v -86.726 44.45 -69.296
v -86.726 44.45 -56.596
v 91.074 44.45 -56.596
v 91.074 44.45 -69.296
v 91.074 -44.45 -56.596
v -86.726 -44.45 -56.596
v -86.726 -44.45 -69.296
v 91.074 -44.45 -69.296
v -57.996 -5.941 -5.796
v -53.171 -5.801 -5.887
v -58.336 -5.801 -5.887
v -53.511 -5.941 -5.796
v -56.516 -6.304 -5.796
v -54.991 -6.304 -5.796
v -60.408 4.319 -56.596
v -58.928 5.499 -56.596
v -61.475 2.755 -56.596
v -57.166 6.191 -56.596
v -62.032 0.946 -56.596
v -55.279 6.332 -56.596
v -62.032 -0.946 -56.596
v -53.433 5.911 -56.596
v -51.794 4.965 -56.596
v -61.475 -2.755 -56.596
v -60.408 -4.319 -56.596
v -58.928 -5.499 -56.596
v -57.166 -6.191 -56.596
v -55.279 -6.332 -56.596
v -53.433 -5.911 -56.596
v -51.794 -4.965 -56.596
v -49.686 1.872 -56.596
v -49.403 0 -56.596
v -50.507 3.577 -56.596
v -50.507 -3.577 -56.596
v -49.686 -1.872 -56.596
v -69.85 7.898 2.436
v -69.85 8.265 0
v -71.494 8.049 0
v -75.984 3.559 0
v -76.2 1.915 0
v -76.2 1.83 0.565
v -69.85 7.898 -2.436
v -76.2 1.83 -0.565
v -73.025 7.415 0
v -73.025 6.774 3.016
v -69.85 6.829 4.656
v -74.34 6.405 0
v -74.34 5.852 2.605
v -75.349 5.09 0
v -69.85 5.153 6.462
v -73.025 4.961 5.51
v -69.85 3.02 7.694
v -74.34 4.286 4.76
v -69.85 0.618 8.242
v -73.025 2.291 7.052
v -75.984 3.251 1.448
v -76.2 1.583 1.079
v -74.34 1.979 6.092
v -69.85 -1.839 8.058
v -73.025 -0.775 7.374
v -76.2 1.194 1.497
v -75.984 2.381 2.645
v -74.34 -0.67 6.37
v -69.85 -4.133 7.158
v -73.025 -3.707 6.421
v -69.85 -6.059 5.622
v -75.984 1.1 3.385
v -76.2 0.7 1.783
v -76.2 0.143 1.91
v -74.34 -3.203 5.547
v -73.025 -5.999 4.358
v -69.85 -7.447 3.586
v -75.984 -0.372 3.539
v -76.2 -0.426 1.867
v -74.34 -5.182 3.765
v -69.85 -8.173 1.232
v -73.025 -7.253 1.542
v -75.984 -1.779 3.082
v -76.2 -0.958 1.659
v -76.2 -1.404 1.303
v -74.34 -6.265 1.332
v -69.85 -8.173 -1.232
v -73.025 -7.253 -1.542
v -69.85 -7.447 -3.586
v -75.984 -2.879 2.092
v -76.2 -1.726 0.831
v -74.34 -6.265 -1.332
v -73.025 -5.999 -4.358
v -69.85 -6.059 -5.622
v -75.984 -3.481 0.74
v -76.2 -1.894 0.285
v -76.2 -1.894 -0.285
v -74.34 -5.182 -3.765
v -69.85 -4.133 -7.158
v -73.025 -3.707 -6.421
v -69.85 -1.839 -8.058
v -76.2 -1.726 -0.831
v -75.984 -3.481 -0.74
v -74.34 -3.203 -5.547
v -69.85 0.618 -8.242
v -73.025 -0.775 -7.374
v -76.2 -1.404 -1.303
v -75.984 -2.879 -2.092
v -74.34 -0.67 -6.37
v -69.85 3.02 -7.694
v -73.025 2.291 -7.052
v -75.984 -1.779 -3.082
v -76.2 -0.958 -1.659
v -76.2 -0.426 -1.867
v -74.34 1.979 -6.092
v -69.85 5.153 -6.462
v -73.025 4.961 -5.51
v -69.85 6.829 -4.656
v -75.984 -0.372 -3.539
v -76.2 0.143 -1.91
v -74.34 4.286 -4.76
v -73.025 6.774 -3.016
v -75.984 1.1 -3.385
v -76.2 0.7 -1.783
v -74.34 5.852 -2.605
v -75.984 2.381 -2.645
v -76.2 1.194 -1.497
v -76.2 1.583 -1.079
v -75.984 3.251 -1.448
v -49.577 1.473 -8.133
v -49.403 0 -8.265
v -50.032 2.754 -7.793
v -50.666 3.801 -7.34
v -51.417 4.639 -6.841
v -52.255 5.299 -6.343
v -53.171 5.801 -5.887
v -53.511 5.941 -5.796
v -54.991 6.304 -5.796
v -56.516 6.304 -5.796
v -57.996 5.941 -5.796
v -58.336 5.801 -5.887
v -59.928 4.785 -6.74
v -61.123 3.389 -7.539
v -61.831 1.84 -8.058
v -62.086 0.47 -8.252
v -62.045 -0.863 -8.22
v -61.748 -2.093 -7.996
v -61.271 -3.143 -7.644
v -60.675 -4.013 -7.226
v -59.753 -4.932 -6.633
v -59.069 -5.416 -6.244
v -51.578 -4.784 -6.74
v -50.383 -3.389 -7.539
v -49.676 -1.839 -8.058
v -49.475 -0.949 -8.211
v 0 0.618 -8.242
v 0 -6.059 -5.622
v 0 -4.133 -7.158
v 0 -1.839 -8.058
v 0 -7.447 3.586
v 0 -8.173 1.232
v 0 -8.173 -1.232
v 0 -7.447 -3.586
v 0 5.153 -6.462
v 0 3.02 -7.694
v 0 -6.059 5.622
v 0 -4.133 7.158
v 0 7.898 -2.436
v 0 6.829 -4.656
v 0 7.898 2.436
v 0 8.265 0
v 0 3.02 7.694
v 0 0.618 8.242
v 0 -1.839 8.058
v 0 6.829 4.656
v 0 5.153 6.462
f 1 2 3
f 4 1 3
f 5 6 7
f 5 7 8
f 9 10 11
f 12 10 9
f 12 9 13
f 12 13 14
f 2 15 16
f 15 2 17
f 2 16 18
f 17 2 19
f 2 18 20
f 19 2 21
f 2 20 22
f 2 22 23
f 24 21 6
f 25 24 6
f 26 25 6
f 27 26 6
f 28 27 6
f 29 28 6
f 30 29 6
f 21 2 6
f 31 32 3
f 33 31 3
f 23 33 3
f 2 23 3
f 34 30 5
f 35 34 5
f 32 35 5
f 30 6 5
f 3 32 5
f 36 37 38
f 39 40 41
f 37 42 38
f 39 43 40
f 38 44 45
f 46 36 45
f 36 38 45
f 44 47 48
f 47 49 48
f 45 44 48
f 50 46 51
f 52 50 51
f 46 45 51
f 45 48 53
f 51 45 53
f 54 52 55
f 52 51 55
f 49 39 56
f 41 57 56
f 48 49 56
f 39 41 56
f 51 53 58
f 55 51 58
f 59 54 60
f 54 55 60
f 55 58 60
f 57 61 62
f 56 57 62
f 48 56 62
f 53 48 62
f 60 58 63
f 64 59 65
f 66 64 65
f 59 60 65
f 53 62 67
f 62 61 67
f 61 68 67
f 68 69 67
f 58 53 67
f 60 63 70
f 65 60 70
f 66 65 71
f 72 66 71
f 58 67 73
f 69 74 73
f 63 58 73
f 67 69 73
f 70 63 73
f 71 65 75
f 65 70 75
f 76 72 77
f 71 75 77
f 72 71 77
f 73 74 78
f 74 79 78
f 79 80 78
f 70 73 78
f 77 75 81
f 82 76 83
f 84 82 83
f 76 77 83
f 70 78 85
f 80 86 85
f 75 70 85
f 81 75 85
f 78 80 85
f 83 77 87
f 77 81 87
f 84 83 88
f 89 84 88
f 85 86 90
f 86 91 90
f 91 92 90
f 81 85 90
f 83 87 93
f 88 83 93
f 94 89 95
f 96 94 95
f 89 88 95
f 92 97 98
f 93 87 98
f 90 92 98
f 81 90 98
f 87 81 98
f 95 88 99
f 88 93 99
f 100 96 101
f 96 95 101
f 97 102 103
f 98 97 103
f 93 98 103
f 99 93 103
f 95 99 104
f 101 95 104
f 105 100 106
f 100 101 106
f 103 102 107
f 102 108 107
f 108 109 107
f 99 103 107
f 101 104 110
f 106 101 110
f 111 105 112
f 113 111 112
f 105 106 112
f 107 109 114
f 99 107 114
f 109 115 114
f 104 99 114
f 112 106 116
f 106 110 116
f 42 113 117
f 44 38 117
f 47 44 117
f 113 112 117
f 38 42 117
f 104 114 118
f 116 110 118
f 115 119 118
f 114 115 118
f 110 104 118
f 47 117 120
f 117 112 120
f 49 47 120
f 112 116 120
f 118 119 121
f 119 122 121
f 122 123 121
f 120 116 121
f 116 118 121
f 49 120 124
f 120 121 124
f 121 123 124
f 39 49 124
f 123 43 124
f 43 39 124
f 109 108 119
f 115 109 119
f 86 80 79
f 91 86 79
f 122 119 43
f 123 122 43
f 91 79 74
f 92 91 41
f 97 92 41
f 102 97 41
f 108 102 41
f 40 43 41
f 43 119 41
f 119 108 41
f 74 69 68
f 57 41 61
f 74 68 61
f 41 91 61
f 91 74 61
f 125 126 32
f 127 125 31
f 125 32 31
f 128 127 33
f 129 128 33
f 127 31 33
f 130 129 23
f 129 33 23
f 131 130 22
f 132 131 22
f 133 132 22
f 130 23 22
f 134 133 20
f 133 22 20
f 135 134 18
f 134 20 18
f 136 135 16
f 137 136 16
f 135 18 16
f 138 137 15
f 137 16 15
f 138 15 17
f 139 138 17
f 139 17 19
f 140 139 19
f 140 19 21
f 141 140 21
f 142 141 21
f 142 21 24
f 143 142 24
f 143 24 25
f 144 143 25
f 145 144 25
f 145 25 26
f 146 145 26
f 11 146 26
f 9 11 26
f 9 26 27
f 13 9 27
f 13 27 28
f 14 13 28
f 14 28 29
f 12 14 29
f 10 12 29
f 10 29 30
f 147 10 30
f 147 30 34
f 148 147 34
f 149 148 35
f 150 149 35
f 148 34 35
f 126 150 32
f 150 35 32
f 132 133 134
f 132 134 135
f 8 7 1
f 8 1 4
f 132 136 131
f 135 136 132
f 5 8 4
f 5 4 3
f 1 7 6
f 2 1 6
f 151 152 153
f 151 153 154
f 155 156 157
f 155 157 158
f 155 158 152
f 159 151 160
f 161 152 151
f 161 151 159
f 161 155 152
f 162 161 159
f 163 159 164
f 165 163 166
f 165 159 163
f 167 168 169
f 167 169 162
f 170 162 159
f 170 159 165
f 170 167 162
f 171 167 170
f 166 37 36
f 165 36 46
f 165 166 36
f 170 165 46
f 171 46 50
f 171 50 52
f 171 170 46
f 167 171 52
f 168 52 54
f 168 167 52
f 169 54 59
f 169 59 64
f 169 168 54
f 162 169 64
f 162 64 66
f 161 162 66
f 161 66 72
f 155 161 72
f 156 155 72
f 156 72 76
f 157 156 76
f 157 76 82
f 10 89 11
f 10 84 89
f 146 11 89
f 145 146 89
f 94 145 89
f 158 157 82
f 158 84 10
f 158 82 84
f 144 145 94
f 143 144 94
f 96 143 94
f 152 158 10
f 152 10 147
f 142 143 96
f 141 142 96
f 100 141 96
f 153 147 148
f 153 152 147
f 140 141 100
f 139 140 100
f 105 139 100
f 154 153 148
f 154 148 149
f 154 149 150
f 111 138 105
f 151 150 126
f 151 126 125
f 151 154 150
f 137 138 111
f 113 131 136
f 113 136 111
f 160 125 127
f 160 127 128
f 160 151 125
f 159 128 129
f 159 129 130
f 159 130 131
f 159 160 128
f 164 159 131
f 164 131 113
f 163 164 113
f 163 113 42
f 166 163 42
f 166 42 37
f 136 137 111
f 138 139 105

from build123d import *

# Parameters (mm, degrees)
F0_W     = 177.8
F0_H     = 12.7
F1_DEPTH = 44.45
F2_R     = 6.35
F3_DEPTH = 50.8
F4_R     = 10.728509
F5_DEPTH = 127
F6_R     = 8.265321
F7_DEPTH = 76.2
F8_R     = 6.35


with BuildPart() as f1:
    # F0 (on Front) → F1 (new body, symmetric)
    with BuildSketch(Plane.XZ):
        with Locations((2.174042, -62.946092)):
            Rectangle(F0_W, F0_H)
    extrude(amount=F1_DEPTH, both=True)

    # F2 (on face) → F3 (join)
    with BuildSketch(Plane.XY.offset(-56.596092)):
        with Locations((-55.75341, 0)):
            Circle(F2_R)
    extrude(amount=F3_DEPTH)

    # F4 (on Right) → F5 (cut)
    with BuildSketch(Plane.YZ):
        with Locations((0, 3.137364)):
            Circle(F4_R)
    extrude(amount=-F5_DEPTH, mode=Mode.SUBTRACT)

    # F6 (on Right) → F7 (join)
    with BuildSketch(Plane.YZ):
        Circle(F6_R)
    extrude(amount=-F7_DEPTH)

    # F8
    f8_edges = [f1.edges().sort_by_distance(p)[0] for p in [
        (-76.2, -8.265321, 0),
    ]]
    fillet(f8_edges, radius=F8_R)


solid = f1.part
